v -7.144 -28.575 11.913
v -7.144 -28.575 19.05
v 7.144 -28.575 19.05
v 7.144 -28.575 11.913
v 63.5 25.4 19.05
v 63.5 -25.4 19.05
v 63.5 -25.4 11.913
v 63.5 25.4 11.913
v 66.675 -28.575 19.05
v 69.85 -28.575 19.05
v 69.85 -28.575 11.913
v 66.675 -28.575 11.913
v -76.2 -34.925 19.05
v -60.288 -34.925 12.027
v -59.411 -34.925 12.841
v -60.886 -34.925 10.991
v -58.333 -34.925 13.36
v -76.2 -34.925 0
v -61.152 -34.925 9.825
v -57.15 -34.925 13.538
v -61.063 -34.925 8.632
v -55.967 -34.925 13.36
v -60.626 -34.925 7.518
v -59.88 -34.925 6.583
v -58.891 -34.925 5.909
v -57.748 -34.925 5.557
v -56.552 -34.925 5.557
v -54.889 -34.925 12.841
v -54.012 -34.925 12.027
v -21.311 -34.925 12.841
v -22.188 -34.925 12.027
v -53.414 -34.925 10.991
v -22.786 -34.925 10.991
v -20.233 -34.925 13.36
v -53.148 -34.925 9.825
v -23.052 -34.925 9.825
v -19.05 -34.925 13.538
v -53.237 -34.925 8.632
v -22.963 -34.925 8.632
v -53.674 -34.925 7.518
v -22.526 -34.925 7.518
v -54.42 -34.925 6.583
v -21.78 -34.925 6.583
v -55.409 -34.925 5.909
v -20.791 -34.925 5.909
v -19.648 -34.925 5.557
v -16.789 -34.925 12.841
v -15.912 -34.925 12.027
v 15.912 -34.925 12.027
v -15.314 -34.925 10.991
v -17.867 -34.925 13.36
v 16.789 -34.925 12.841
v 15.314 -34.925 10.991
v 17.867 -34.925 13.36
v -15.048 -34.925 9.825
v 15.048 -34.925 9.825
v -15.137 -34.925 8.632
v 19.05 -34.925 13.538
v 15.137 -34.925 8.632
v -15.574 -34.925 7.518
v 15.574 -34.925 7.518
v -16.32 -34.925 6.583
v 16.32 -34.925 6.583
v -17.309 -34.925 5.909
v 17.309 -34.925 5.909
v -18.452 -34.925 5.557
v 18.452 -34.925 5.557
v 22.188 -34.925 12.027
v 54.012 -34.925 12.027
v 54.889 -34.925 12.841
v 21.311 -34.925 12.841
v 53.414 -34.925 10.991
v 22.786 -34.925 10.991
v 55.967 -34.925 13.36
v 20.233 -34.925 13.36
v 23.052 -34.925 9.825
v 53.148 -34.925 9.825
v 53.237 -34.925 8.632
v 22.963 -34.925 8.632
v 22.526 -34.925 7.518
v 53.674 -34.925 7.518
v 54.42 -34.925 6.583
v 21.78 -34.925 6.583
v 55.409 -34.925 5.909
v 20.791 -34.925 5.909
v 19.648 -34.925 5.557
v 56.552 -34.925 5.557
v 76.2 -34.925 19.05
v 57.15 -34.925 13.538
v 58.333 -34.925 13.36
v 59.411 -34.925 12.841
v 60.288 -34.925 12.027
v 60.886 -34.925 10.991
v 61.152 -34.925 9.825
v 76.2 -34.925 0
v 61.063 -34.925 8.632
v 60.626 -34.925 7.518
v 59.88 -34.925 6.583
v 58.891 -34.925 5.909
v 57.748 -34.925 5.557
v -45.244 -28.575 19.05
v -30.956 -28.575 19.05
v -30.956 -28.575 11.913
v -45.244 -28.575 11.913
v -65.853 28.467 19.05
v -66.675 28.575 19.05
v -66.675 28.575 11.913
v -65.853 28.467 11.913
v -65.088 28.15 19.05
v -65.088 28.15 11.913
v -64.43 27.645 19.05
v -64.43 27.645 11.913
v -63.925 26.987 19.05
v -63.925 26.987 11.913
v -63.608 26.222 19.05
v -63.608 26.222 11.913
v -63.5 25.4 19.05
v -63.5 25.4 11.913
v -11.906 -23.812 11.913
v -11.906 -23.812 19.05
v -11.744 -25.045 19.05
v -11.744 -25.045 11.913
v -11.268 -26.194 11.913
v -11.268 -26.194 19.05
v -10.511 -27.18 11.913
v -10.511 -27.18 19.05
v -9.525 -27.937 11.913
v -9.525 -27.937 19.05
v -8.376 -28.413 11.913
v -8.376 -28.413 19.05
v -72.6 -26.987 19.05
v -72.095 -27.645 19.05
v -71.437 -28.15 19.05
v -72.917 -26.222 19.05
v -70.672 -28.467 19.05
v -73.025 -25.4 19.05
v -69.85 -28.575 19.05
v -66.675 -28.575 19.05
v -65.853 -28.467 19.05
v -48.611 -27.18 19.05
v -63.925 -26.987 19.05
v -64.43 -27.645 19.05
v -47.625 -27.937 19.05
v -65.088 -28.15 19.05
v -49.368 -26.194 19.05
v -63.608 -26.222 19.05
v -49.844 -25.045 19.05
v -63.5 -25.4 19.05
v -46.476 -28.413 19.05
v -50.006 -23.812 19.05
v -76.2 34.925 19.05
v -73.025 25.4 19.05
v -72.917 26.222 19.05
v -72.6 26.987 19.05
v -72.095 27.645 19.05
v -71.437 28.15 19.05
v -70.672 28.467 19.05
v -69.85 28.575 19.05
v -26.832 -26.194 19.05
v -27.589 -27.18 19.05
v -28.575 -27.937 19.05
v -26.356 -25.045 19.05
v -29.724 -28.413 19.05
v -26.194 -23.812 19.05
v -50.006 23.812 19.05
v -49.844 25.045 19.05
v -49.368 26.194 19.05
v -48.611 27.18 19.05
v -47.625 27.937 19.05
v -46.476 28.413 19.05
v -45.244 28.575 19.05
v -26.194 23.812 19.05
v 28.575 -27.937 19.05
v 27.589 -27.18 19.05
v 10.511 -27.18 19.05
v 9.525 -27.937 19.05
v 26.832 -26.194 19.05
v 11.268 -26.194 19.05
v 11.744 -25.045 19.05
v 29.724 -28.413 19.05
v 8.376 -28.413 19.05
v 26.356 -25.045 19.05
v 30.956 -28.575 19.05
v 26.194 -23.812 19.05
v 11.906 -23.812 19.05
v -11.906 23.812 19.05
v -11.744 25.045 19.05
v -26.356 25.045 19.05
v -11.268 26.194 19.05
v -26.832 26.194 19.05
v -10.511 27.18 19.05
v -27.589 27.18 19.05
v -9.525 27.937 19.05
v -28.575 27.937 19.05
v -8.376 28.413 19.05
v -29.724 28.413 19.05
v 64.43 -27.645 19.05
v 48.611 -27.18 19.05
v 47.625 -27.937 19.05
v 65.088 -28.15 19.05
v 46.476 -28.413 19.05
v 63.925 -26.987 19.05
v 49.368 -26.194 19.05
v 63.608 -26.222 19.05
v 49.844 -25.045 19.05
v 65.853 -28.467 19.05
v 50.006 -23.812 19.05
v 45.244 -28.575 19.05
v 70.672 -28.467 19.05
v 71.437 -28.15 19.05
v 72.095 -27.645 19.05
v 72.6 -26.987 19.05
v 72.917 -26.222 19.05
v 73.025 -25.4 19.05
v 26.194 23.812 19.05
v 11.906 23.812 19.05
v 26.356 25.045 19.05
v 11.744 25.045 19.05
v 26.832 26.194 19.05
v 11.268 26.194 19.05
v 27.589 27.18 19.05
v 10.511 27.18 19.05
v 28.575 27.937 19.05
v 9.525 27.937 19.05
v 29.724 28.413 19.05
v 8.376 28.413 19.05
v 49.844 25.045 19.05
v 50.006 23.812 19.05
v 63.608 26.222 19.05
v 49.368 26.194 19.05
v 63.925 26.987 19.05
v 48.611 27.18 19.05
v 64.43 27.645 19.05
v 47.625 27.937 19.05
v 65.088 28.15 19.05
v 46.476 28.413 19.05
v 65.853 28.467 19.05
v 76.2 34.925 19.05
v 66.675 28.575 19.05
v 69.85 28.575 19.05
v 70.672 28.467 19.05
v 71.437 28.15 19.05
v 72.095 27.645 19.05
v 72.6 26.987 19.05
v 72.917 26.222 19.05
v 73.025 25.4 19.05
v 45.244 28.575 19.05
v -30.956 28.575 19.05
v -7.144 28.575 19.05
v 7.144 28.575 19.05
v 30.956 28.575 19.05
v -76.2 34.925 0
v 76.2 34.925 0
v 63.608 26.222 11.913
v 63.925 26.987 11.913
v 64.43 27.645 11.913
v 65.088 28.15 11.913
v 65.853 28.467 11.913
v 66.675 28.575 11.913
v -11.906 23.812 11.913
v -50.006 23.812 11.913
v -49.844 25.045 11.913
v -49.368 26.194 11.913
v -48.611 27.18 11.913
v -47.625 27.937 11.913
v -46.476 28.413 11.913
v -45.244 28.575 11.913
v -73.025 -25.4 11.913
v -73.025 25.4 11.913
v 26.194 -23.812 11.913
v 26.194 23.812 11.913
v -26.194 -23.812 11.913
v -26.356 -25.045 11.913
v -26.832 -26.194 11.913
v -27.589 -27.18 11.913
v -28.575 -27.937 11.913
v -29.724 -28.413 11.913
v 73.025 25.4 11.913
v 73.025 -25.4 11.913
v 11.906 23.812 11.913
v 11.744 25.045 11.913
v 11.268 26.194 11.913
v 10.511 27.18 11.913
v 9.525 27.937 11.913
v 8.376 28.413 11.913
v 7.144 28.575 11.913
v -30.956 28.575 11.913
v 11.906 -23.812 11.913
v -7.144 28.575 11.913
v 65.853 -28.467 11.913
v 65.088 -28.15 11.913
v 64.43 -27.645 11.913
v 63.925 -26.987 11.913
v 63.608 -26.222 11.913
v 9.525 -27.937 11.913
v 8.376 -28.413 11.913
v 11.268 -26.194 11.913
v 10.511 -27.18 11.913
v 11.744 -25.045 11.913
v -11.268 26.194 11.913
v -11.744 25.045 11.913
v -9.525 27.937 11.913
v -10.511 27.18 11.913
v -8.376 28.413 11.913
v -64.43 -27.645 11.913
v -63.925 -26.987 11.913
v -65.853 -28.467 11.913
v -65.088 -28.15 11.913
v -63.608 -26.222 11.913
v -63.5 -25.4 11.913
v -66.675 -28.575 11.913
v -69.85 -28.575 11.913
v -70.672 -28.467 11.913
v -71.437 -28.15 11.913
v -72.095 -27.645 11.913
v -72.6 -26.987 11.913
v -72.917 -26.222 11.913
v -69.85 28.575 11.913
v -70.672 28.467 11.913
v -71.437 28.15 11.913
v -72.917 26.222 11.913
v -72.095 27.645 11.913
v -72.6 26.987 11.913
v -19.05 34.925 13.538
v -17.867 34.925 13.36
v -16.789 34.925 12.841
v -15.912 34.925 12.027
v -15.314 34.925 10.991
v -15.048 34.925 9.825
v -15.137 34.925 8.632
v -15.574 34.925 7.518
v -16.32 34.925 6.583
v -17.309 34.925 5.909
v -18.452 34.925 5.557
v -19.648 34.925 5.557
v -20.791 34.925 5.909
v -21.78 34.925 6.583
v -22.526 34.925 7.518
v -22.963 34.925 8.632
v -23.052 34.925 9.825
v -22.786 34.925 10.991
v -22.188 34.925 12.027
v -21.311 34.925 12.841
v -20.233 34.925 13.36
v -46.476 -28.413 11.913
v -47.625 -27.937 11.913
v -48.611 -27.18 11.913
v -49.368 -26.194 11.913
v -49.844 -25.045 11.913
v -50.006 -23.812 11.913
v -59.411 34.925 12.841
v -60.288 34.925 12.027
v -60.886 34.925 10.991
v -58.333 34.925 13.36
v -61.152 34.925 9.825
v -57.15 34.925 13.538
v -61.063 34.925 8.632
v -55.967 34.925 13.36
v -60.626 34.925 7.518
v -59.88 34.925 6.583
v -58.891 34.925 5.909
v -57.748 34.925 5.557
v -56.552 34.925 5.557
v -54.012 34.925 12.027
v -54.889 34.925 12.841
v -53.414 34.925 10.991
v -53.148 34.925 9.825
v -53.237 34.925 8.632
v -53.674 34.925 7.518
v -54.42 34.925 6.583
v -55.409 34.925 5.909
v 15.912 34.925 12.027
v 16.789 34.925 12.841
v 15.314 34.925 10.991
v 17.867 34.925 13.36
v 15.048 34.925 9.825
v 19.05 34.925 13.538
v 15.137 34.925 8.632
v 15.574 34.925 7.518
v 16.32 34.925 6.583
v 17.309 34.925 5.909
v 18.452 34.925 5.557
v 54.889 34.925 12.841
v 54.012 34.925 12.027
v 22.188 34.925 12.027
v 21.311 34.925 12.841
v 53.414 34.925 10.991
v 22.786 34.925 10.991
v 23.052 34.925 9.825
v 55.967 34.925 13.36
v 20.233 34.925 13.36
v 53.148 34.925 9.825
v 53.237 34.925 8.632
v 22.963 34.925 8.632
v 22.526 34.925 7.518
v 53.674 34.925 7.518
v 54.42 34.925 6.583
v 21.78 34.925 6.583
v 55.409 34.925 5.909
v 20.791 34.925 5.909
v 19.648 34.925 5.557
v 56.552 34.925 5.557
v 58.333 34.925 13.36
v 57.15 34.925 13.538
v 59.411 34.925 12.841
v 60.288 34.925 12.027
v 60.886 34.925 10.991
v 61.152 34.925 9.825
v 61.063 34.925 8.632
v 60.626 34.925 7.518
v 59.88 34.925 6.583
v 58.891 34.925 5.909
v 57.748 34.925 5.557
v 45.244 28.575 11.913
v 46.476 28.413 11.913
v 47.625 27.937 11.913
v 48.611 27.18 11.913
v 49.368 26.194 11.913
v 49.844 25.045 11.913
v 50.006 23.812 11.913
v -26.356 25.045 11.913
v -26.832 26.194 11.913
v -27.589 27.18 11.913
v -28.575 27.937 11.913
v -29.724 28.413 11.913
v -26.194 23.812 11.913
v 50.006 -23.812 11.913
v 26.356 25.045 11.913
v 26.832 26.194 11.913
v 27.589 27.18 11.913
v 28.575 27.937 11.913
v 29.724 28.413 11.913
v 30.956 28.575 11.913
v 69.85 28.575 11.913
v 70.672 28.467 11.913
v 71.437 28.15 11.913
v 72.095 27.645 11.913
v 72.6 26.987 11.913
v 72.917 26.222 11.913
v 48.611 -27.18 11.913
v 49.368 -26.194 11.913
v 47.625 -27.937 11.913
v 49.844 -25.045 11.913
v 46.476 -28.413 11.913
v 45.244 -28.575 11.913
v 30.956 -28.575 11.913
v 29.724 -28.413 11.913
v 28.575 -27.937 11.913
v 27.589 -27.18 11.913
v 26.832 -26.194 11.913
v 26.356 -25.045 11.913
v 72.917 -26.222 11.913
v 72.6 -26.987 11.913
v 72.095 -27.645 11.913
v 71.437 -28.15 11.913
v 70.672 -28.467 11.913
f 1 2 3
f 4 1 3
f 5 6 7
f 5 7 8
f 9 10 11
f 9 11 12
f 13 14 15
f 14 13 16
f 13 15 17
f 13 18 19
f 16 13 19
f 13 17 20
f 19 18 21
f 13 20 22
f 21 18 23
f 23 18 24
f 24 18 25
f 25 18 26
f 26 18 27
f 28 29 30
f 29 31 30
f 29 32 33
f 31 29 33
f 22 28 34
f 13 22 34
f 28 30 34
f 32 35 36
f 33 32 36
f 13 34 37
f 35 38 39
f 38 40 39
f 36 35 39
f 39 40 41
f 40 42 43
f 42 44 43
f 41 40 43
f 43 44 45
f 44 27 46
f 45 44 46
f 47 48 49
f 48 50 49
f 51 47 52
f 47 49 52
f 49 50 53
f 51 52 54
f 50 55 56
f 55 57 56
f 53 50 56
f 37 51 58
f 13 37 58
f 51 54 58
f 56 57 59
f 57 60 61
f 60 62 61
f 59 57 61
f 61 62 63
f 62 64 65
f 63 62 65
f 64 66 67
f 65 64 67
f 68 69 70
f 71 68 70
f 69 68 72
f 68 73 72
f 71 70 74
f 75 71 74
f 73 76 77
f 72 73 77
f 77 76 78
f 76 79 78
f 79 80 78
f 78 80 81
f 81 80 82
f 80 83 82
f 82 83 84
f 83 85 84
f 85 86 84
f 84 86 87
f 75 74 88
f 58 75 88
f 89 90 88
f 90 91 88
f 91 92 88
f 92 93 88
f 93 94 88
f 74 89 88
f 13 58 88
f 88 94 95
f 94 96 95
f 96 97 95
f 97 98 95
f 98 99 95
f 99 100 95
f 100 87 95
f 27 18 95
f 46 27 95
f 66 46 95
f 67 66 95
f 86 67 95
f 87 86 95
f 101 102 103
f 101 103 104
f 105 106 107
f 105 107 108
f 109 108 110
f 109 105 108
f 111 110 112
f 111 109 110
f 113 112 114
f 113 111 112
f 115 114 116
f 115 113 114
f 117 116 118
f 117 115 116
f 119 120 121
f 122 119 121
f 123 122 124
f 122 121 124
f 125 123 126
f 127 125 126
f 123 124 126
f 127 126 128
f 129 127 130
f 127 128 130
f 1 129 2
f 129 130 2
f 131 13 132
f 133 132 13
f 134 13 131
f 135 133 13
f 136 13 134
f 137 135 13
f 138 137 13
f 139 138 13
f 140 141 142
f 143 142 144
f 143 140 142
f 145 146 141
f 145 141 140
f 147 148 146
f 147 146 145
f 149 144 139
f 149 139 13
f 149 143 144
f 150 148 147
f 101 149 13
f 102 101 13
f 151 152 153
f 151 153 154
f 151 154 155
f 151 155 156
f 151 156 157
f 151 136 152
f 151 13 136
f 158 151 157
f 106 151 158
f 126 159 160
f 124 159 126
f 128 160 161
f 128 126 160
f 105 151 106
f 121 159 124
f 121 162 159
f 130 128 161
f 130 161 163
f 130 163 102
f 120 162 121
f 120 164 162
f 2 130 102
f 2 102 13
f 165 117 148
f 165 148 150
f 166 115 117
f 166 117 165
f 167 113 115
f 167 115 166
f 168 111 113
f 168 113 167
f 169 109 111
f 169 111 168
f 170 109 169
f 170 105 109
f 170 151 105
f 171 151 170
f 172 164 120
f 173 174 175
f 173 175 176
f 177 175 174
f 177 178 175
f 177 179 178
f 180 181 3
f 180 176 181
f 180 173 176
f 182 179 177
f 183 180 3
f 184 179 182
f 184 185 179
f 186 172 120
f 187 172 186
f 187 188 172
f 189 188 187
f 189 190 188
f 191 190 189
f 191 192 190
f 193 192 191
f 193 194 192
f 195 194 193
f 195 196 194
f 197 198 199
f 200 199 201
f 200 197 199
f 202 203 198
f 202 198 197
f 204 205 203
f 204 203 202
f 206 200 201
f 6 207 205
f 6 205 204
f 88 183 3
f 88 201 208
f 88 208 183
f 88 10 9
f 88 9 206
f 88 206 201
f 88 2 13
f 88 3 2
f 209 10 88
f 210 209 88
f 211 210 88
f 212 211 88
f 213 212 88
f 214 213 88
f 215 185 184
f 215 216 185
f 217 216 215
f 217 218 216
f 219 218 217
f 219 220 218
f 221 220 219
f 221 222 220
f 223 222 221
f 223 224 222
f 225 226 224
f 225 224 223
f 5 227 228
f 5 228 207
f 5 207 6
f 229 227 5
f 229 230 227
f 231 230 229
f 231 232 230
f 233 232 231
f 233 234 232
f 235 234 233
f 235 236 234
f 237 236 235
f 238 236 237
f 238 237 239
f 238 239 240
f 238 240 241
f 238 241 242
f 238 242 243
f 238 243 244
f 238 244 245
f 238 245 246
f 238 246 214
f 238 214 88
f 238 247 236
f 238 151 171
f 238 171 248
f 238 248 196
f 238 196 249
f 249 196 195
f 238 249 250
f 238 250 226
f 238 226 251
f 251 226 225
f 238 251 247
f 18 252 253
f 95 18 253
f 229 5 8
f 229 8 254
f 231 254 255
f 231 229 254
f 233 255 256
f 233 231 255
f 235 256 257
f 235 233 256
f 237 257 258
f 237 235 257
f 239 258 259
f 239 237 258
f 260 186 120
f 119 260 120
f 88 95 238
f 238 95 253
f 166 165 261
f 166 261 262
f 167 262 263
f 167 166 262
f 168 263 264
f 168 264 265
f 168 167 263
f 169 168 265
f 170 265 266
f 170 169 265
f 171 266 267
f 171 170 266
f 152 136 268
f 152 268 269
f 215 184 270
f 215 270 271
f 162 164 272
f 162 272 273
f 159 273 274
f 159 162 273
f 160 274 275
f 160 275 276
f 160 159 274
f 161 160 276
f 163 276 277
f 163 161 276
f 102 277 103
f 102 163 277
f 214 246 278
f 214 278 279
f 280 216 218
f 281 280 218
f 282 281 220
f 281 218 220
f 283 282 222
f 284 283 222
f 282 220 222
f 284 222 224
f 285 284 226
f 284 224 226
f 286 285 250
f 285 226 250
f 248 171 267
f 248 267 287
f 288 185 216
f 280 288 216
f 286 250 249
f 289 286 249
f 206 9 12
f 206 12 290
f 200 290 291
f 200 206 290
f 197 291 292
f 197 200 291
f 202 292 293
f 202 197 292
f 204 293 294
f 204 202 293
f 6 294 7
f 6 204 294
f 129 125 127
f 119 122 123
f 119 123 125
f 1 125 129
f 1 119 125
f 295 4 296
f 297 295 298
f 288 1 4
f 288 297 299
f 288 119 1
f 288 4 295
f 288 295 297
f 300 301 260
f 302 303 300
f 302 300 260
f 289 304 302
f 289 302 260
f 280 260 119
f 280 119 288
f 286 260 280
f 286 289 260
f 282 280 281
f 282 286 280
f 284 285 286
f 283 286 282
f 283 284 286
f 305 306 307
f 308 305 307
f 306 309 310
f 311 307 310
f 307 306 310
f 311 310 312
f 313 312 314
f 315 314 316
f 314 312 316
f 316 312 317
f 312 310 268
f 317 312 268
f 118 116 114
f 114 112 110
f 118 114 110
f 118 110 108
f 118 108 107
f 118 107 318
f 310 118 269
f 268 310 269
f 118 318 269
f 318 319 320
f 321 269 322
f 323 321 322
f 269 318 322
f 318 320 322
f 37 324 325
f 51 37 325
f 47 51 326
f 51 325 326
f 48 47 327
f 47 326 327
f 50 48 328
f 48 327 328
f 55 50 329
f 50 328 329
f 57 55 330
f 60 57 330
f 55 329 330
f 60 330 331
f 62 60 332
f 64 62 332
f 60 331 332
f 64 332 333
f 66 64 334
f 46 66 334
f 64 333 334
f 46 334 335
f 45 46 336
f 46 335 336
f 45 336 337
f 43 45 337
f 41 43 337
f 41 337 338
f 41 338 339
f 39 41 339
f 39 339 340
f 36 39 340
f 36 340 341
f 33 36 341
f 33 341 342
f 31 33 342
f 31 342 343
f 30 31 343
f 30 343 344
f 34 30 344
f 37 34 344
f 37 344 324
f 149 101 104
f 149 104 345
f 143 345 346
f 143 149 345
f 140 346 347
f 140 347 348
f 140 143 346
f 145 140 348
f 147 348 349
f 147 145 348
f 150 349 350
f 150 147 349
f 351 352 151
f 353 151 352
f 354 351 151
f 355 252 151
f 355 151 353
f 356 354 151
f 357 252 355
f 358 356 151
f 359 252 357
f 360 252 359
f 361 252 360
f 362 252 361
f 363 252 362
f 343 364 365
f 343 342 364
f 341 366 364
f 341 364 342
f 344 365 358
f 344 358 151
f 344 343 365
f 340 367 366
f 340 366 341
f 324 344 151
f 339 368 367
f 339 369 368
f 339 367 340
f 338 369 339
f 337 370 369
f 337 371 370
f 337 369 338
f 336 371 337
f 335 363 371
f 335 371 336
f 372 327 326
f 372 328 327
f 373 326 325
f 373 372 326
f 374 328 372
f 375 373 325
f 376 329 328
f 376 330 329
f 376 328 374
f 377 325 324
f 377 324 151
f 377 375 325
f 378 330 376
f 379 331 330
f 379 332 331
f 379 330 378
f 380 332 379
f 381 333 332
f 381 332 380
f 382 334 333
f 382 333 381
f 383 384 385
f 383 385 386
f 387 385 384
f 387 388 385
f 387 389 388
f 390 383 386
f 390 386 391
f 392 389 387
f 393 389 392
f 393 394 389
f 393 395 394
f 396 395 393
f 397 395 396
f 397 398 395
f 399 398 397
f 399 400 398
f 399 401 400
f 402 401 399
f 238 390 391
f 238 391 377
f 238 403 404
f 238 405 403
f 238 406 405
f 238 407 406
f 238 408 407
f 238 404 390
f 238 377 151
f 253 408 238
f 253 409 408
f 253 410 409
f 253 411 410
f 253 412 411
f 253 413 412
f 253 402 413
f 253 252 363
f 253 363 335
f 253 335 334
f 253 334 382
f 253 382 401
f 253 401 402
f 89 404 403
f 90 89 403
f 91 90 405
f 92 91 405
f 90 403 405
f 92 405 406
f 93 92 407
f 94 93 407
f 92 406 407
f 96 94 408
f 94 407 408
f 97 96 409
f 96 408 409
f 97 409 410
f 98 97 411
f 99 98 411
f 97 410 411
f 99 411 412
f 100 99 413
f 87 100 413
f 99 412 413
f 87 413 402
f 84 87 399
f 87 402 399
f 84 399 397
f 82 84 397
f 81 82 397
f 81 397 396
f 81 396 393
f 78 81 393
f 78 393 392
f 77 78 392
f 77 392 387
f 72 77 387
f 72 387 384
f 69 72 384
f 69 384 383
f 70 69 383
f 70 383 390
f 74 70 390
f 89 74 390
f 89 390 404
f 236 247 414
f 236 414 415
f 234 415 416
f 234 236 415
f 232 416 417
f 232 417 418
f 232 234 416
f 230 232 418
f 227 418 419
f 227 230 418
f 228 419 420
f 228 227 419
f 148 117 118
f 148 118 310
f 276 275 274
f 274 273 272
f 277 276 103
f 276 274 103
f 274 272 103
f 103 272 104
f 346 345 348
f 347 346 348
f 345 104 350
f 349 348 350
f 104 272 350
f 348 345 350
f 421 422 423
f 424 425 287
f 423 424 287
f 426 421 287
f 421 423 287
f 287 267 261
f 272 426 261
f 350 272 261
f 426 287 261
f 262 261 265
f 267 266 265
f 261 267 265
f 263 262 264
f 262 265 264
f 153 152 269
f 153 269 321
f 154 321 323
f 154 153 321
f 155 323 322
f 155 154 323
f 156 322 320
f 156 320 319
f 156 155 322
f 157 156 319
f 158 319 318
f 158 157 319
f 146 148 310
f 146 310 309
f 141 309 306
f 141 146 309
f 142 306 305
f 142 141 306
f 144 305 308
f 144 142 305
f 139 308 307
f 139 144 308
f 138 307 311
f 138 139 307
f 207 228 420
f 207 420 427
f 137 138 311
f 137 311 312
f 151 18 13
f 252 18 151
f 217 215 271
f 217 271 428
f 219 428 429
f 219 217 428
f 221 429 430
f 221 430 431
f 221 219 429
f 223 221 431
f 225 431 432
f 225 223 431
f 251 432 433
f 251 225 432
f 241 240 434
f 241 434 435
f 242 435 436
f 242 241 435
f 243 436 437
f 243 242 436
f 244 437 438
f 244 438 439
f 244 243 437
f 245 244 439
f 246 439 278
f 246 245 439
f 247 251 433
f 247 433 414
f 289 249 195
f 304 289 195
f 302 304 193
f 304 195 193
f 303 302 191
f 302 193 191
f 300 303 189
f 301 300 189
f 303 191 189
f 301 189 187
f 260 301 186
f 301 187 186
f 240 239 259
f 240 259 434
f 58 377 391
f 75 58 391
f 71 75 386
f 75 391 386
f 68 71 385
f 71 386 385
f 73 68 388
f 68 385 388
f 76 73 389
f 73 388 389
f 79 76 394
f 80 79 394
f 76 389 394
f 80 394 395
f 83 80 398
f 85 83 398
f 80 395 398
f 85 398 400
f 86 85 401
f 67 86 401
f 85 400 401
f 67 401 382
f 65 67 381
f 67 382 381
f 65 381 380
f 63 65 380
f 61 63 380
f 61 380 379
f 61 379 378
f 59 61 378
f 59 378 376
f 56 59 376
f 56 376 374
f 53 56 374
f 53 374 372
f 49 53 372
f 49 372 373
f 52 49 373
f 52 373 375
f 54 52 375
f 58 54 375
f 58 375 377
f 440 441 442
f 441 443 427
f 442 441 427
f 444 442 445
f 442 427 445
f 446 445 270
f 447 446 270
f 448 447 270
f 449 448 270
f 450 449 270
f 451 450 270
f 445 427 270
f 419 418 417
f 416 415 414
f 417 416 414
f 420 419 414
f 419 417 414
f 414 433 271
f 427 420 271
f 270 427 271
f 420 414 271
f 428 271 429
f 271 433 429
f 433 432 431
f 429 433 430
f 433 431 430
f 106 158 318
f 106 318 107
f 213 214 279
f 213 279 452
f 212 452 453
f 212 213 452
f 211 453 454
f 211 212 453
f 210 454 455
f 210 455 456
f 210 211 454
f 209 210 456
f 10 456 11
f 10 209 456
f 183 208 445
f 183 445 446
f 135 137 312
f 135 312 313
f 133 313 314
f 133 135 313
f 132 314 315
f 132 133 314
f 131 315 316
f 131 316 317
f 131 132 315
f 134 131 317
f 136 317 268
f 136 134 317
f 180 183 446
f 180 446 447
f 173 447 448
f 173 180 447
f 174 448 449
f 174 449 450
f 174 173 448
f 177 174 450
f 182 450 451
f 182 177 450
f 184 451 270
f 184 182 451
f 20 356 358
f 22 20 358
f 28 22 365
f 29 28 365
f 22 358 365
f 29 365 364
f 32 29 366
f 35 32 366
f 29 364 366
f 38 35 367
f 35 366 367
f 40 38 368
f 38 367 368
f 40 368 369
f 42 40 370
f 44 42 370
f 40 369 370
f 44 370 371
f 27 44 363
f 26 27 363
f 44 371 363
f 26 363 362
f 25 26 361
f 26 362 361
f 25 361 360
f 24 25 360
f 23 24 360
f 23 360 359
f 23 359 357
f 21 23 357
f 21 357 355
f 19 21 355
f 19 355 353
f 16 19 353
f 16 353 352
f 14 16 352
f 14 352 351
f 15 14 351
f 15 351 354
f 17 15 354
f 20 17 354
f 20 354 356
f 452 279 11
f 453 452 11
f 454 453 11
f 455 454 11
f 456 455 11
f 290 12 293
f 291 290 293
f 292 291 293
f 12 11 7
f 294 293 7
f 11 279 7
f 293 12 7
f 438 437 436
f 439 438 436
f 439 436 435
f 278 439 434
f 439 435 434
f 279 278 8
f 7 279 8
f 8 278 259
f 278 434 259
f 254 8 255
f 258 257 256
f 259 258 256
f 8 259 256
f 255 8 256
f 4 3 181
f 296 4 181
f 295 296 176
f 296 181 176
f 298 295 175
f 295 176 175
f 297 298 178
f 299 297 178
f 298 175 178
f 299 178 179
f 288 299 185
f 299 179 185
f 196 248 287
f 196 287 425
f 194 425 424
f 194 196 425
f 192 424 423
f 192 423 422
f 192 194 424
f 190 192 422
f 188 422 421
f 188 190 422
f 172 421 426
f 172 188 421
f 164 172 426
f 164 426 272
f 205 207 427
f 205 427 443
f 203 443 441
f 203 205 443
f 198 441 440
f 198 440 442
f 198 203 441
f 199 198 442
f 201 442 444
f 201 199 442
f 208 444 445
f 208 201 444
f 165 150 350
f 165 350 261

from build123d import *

# Parameters (mm, degrees)
SKETCH1_W           = 152.4
SKETCH1_H           = 69.85
BOSS_EXTRUDE1_DEPTH = 19.05
CUT_EXTRUDE1_DEPTH  = 7.1374
CUT_EXTRUDE2_REACH  = 71.85
SKETCH3_R           = 4.0132


with BuildPart() as part:
    # Sketch1 → Boss-Extrude1 (new body)
    with BuildSketch(Plane.XY):
        Rectangle(SKETCH1_W, SKETCH1_H)
    extrude(amount=BOSS_EXTRUDE1_DEPTH)

    # Sketch2 → Cut-Extrude1 (cut)
    with BuildSketch(Plane.XY.offset(19.05)):
        with BuildLine():
            Line((-45.24375, 28.575), (-30.95625, 28.575))
            ThreePointArc((-30.95625, 28.575), (-27.588653955, 27.180096045), (-26.19375, 23.8125))
            Line((-26.19375, 23.8125), (-26.19375, -23.8125))
            ThreePointArc((-26.19375, -23.8125), (-27.588653955, -27.180096045), (-30.95625, -28.575))
            Line((-30.95625, -28.575), (-45.24375, -28.575))
            ThreePointArc((-45.24375, -28.575), (-48.611346045, -27.180096045), (-50.00625, -23.8125))
            Line((-50.00625, -23.8125), (-50.00625, 23.8125))
            ThreePointArc((-50.00625, 23.8125), (-48.611346045, 27.180096045), (-45.24375, 28.575))
        make_face()
        with BuildLine():
            Line((7.14375, 28.575), (-7.14375, 28.575))
            ThreePointArc((-7.14375, 28.575), (-10.511346045, 27.180096045), (-11.90625, 23.8125))
            Line((-11.90625, 23.8125), (-11.90625, -23.8125))
            ThreePointArc((-11.90625, -23.8125), (-10.511346045, -27.180096045), (-7.14375, -28.575))
            Line((-7.14375, -28.575), (7.14375, -28.575))
            ThreePointArc((7.14375, -28.575), (10.511346045, -27.180096045), (11.90625, -23.8125))
            Line((11.90625, -23.8125), (11.90625, 23.8125))
            ThreePointArc((11.90625, 23.8125), (10.511346045, 27.180096045), (7.14375, 28.575))
        make_face()
        with BuildLine():
            Line((30.95625, 28.575), (45.24375, 28.575))
            ThreePointArc((45.24375, 28.575), (48.611346045, 27.180096045), (50.00625, 23.8125))
            Line((50.00625, 23.8125), (50.00625, -23.8125))
            ThreePointArc((50.00625, -23.8125), (48.611346045, -27.180096045), (45.24375, -28.575))
            Line((45.24375, -28.575), (30.95625, -28.575))
            ThreePointArc((30.95625, -28.575), (27.588653955, -27.180096045), (26.19375, -23.8125))
            Line((26.19375, -23.8125), (26.19375, 23.8125))
            ThreePointArc((26.19375, 23.8125), (27.588653955, 27.180096045), (30.95625, 28.575))
        make_face()
        with BuildLine():
            Line((-69.85, 28.575), (-66.675, 28.575))
            ThreePointArc((-66.675, 28.575), (-64.42993597, 27.64506403), (-63.5, 25.4))
            Line((-63.5, 25.4), (-63.5, -25.4))
            ThreePointArc((-63.5, -25.4), (-64.42993597, -27.64506403), (-66.675, -28.575))
            Line((-66.675, -28.575), (-69.85, -28.575))
            ThreePointArc((-69.85, -28.575), (-72.09506403, -27.64506403), (-73.025, -25.4))
            Line((-73.025, -25.4), (-73.025, 25.4))
            ThreePointArc((-73.025, 25.4), (-72.09506403, 27.64506403), (-69.85, 28.575))
        make_face()
        with BuildLine():
            Line((66.675, 28.575), (69.85, 28.575))
            ThreePointArc((69.85, 28.575), (72.09506403, 27.64506403), (73.025, 25.4))
            Line((73.025, 25.4), (73.025, -25.4))
            ThreePointArc((73.025, -25.4), (72.09506403, -27.64506403), (69.85, -28.575))
            Line((69.85, -28.575), (66.675, -28.575))
            ThreePointArc((66.675, -28.575), (64.42993597, -27.64506403), (63.5, -25.4))
            Line((63.5, -25.4), (63.5, 25.4))
            ThreePointArc((63.5, 25.4), (64.42993597, 27.64506403), (66.675, 28.575))
        make_face()
    extrude(amount=-CUT_EXTRUDE1_DEPTH, mode=Mode.SUBTRACT)

    # Sketch3 → Cut-Extrude2 (cut, up to next)
    with BuildSketch(Plane(origin=(0, 34.925, 0), x_dir=(1, 0, 0), z_dir=(0, 1, 0)), mode=Mode.PRIVATE) as cut_extrude2_sk1:
        with Locations(Location((-57.15, -9.525, 0), (0, 0, 270))):  # turned: the seam where the file's is
            Circle(SKETCH3_R)
    cut_extrude2_tool1 = extrude(cut_extrude2_sk1.sketch, amount=-CUT_EXTRUDE2_REACH, mode=Mode.PRIVATE) & part.part
    add(cut_extrude2_tool1.solids().sort_by_distance((-57.15, 34.925, 9.525))[0], mode=Mode.SUBTRACT)
    # Sketch3 → Cut-Extrude2 (cut, up to next)
    with BuildSketch(Plane(origin=(0, 34.925, 0), x_dir=(1, 0, 0), z_dir=(0, 1, 0)), mode=Mode.PRIVATE) as cut_extrude2_sk2:
        with Locations(Location((-19.05, -9.525, 0), (0, 0, 270))):  # turned: the seam where the file's is
            Circle(SKETCH3_R)
    cut_extrude2_tool2 = extrude(cut_extrude2_sk2.sketch, amount=-CUT_EXTRUDE2_REACH, mode=Mode.PRIVATE) & part.part
    add(cut_extrude2_tool2.solids().sort_by_distance((-19.05, 34.925, 9.525))[0], mode=Mode.SUBTRACT)
    # Sketch3 → Cut-Extrude2 (cut, up to next)
    with BuildSketch(Plane(origin=(0, 34.925, 0), x_dir=(1, 0, 0), z_dir=(0, 1, 0)), mode=Mode.PRIVATE) as cut_extrude2_sk3:
        with Locations(Location((19.05, -9.525, 0), (0, 0, 270))):  # turned: the seam where the file's is
            Circle(SKETCH3_R)
    cut_extrude2_tool3 = extrude(cut_extrude2_sk3.sketch, amount=-CUT_EXTRUDE2_REACH, mode=Mode.PRIVATE) & part.part
    add(cut_extrude2_tool3.solids().sort_by_distance((19.05, 34.925, 9.525))[0], mode=Mode.SUBTRACT)
    # Sketch3 → Cut-Extrude2 (cut, up to next)
    with BuildSketch(Plane(origin=(0, 34.925, 0), x_dir=(1, 0, 0), z_dir=(0, 1, 0)), mode=Mode.PRIVATE) as cut_extrude2_sk4:
        with Locations(Location((57.15, -9.525, 0), (0, 0, 270))):  # turned: the seam where the file's is
            Circle(SKETCH3_R)
    cut_extrude2_tool4 = extrude(cut_extrude2_sk4.sketch, amount=-CUT_EXTRUDE2_REACH, mode=Mode.PRIVATE) & part.part
    add(cut_extrude2_tool4.solids().sort_by_distance((57.15, 34.925, 9.525))[0], mode=Mode.SUBTRACT)


solid = part.part
